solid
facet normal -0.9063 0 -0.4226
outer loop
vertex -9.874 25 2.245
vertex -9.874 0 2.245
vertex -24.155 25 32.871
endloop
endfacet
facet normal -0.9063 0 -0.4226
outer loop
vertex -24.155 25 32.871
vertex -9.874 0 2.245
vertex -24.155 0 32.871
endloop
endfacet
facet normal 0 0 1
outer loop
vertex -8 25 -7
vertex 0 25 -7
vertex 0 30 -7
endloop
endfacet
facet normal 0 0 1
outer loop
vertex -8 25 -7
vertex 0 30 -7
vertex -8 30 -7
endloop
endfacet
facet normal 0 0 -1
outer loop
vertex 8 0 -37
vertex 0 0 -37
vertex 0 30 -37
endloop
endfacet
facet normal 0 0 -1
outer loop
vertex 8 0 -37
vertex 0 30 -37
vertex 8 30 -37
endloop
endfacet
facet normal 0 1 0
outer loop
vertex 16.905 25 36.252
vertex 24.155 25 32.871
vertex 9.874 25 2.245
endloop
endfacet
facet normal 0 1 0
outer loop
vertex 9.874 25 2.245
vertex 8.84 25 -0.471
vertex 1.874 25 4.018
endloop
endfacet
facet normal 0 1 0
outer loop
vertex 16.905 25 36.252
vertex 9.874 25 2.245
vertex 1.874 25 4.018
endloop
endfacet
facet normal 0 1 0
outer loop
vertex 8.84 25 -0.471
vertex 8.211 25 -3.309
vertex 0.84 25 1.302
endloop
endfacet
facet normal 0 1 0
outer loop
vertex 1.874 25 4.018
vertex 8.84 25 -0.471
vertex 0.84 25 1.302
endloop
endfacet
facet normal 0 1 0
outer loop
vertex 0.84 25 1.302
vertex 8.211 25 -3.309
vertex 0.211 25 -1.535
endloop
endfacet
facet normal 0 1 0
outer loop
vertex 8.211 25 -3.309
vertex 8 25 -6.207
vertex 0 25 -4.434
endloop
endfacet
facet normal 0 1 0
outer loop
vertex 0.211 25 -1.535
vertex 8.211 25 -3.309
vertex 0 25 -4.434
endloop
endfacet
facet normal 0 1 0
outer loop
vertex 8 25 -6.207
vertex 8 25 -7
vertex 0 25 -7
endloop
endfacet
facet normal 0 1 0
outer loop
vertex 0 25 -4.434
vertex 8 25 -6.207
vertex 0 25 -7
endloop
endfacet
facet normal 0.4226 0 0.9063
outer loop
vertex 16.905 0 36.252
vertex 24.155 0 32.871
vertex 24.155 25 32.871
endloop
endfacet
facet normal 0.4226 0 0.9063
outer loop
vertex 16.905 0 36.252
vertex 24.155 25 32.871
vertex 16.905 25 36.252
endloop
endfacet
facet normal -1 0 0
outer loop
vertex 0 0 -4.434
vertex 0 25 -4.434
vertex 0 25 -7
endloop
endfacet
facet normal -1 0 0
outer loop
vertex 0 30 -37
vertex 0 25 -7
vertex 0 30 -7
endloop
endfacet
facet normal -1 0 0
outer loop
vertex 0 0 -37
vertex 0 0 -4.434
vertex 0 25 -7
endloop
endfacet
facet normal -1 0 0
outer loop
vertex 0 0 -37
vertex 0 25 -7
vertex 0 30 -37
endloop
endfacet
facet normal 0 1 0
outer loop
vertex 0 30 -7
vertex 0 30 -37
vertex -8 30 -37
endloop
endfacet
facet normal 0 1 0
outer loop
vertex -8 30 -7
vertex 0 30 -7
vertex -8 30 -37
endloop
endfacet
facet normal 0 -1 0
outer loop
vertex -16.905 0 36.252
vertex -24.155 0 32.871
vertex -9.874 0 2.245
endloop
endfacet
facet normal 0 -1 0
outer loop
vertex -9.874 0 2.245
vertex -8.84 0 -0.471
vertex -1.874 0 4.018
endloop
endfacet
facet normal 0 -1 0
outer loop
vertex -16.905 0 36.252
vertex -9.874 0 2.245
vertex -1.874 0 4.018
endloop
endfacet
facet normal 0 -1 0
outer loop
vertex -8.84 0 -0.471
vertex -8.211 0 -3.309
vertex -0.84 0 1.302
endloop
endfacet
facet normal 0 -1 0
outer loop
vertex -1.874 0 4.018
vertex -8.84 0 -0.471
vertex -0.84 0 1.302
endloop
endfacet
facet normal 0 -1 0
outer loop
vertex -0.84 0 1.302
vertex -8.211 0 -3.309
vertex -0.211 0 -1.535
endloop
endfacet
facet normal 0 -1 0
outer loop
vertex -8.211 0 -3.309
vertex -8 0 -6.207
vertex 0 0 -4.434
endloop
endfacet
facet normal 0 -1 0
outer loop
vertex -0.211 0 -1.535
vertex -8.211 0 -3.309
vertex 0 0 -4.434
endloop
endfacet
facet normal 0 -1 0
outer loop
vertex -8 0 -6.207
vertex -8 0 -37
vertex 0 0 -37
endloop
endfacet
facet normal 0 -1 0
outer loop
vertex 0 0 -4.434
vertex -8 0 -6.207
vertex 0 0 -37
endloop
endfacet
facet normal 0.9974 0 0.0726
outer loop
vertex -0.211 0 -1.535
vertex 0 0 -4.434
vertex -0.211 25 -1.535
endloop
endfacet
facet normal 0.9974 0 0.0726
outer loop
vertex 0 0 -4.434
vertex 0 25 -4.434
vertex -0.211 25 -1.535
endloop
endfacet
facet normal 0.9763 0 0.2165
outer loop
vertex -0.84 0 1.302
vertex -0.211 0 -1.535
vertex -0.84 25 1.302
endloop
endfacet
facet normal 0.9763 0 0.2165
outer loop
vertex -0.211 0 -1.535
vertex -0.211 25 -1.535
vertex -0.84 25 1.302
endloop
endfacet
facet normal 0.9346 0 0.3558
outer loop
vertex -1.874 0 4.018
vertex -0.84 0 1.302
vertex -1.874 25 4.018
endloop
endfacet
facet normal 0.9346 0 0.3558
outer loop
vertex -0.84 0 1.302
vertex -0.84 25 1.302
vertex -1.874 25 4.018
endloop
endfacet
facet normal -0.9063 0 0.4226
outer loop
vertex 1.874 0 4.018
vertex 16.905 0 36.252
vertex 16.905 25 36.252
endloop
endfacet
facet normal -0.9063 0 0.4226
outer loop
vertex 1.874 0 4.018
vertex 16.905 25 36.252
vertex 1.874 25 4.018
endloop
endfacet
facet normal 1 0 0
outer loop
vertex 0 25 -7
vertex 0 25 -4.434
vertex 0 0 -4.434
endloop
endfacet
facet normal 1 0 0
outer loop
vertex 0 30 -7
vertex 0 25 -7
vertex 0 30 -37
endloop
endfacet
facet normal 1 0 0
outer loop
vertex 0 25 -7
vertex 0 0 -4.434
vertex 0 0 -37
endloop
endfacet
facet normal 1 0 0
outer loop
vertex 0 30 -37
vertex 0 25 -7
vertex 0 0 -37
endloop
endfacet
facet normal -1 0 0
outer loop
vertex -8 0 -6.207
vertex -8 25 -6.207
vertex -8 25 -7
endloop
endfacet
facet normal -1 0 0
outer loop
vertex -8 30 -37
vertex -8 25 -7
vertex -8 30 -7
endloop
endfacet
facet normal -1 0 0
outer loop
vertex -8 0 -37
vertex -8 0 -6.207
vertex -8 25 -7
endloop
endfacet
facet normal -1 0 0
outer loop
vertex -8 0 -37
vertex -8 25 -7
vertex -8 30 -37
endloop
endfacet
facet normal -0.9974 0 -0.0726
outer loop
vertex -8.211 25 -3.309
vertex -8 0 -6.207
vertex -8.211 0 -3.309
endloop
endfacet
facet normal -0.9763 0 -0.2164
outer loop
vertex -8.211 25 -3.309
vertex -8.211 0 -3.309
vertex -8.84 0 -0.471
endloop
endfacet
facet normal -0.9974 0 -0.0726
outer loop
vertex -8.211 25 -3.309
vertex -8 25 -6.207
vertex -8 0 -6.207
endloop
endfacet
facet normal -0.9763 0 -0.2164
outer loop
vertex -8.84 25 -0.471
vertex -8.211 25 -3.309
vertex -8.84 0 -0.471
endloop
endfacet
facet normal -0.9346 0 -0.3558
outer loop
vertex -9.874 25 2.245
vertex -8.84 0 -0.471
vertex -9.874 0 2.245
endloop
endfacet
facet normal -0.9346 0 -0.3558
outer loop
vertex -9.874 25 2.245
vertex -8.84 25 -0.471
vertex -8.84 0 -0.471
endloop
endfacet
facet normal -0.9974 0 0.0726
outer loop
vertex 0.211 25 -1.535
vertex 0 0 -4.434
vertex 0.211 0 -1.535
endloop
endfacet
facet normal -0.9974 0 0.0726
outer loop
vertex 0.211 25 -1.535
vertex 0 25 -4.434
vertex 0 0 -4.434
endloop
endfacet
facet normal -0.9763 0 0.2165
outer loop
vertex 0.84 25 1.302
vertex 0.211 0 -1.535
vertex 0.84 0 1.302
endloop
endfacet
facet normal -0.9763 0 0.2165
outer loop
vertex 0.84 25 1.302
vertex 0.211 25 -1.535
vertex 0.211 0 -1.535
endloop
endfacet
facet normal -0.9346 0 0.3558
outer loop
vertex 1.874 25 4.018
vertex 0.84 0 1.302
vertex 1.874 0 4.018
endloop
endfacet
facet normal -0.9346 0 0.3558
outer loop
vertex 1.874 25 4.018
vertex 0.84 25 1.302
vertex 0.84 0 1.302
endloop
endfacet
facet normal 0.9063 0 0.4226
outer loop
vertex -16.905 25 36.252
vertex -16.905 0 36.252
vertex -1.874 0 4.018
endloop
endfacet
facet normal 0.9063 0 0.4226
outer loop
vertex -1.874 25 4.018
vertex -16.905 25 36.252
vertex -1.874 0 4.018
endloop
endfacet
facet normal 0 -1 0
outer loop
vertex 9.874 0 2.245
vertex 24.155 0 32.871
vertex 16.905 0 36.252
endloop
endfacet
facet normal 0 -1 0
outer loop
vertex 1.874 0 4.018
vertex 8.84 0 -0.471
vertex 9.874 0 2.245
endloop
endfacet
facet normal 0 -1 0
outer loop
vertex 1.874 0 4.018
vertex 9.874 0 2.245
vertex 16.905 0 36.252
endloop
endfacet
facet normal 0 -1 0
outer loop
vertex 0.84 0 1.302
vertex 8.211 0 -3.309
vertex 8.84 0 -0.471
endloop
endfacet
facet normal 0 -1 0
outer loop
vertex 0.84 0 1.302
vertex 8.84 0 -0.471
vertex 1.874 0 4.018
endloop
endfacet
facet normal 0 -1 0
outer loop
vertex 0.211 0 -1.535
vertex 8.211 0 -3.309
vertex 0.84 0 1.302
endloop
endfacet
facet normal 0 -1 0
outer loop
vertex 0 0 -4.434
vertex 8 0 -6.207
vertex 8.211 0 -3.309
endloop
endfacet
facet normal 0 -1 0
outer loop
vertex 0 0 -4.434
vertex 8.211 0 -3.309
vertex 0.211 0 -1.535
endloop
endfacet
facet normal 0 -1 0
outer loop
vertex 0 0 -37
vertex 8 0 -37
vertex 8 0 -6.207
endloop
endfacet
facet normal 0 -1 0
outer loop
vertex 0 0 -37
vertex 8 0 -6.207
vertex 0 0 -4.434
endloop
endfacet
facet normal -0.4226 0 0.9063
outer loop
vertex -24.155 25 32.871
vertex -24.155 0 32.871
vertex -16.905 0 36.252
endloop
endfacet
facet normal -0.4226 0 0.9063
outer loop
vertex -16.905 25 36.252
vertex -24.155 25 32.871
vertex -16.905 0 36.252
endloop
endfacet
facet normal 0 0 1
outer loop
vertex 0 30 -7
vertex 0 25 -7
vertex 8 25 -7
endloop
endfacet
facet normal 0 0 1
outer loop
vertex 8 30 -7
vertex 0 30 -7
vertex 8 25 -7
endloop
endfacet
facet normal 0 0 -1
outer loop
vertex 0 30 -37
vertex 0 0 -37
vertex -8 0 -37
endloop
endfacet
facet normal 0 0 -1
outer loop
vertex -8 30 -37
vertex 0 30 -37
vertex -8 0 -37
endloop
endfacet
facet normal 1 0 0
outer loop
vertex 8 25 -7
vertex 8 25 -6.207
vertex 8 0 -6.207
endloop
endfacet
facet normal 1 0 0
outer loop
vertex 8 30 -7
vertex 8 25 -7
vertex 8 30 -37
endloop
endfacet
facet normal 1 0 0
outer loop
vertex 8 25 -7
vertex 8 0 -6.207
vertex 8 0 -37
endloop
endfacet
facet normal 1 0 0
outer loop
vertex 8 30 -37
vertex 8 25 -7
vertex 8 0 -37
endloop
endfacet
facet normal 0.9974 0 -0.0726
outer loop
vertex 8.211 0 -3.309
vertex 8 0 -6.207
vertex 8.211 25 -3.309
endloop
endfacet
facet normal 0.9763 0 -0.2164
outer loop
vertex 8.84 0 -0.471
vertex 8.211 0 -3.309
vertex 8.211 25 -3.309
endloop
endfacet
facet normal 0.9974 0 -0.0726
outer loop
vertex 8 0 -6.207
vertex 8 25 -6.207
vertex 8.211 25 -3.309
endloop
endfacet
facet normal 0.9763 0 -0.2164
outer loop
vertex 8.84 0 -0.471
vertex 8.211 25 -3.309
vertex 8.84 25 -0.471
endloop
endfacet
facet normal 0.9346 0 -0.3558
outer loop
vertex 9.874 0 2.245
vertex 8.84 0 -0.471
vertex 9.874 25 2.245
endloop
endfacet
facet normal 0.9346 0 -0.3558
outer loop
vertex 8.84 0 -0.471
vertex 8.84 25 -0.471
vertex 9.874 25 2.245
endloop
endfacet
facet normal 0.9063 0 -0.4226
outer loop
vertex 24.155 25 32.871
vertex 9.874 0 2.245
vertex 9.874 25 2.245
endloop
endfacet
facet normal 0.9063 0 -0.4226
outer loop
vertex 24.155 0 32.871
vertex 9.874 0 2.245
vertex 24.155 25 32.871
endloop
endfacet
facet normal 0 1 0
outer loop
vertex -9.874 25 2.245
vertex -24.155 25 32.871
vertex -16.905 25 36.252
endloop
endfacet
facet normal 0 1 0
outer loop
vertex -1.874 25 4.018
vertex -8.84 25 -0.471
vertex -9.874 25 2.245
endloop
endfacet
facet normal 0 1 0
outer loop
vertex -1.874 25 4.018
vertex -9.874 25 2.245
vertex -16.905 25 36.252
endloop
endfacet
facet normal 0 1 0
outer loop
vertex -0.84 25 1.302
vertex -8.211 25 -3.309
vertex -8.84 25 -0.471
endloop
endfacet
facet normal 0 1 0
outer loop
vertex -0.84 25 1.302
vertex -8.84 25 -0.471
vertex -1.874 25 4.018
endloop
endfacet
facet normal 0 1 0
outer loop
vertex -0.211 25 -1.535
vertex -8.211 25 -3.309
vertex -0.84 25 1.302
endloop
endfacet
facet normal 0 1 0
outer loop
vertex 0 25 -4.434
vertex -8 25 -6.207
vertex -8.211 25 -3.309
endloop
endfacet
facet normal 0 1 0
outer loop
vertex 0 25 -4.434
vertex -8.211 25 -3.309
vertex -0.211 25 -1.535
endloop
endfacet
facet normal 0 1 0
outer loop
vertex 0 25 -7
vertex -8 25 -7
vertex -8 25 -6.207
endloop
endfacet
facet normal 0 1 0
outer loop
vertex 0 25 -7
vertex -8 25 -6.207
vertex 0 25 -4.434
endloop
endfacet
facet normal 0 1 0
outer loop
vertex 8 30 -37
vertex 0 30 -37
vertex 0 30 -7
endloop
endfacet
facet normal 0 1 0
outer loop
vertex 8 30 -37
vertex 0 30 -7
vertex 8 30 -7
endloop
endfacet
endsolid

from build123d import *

# Parameters (mm, degrees)
BOSS_EXTRUDE1_DEPTH = 25
SKETCH2_W           = 8
SKETCH2_H           = 30
BOSS_EXTRUDE2_DEPTH = 5
FILLET1_R           = 20


with BuildPart() as part:
    # Sketch1 → Boss-Extrude1 (new body)
    with BuildSketch(Plane(origin=(0, 0, 0), x_dir=(1, 0, 0), z_dir=(0, 1, 0))):
        Polygon((0, 0), (0, 37), (8, 37), (8, 1.773557301), (24.155192766, -32.871365388), (16.90473047, -36.252311481), align=None)
    extrude(amount=BOSS_EXTRUDE1_DEPTH)

    # Sketch2 → Boss-Extrude2 (add)
    with BuildSketch(Plane(origin=(0, 25, 0), x_dir=(1, 0, 0), z_dir=(0, 1, 0))):
        with Locations((4, 22)):
            Rectangle(SKETCH2_W, SKETCH2_H)
    extrude(amount=BOSS_EXTRUDE2_DEPTH)

    # Fillet1
    fillet1_edges = [part.edges().sort_by_distance(p)[0] for p in [
        (0, 12.5, 0),
        (8, 12.5, -1.773557301),
    ]]
    fillet(fillet1_edges, radius=FILLET1_R)


with BuildPart() as body_2:
    # Mirror1: mirrored copy
    add(part.part.mirror(Plane(origin=(0, 0, 0), x_dir=(0, 0, 1), z_dir=(1, 0, 0))))


solid = Compound([part.part, body_2.part])
